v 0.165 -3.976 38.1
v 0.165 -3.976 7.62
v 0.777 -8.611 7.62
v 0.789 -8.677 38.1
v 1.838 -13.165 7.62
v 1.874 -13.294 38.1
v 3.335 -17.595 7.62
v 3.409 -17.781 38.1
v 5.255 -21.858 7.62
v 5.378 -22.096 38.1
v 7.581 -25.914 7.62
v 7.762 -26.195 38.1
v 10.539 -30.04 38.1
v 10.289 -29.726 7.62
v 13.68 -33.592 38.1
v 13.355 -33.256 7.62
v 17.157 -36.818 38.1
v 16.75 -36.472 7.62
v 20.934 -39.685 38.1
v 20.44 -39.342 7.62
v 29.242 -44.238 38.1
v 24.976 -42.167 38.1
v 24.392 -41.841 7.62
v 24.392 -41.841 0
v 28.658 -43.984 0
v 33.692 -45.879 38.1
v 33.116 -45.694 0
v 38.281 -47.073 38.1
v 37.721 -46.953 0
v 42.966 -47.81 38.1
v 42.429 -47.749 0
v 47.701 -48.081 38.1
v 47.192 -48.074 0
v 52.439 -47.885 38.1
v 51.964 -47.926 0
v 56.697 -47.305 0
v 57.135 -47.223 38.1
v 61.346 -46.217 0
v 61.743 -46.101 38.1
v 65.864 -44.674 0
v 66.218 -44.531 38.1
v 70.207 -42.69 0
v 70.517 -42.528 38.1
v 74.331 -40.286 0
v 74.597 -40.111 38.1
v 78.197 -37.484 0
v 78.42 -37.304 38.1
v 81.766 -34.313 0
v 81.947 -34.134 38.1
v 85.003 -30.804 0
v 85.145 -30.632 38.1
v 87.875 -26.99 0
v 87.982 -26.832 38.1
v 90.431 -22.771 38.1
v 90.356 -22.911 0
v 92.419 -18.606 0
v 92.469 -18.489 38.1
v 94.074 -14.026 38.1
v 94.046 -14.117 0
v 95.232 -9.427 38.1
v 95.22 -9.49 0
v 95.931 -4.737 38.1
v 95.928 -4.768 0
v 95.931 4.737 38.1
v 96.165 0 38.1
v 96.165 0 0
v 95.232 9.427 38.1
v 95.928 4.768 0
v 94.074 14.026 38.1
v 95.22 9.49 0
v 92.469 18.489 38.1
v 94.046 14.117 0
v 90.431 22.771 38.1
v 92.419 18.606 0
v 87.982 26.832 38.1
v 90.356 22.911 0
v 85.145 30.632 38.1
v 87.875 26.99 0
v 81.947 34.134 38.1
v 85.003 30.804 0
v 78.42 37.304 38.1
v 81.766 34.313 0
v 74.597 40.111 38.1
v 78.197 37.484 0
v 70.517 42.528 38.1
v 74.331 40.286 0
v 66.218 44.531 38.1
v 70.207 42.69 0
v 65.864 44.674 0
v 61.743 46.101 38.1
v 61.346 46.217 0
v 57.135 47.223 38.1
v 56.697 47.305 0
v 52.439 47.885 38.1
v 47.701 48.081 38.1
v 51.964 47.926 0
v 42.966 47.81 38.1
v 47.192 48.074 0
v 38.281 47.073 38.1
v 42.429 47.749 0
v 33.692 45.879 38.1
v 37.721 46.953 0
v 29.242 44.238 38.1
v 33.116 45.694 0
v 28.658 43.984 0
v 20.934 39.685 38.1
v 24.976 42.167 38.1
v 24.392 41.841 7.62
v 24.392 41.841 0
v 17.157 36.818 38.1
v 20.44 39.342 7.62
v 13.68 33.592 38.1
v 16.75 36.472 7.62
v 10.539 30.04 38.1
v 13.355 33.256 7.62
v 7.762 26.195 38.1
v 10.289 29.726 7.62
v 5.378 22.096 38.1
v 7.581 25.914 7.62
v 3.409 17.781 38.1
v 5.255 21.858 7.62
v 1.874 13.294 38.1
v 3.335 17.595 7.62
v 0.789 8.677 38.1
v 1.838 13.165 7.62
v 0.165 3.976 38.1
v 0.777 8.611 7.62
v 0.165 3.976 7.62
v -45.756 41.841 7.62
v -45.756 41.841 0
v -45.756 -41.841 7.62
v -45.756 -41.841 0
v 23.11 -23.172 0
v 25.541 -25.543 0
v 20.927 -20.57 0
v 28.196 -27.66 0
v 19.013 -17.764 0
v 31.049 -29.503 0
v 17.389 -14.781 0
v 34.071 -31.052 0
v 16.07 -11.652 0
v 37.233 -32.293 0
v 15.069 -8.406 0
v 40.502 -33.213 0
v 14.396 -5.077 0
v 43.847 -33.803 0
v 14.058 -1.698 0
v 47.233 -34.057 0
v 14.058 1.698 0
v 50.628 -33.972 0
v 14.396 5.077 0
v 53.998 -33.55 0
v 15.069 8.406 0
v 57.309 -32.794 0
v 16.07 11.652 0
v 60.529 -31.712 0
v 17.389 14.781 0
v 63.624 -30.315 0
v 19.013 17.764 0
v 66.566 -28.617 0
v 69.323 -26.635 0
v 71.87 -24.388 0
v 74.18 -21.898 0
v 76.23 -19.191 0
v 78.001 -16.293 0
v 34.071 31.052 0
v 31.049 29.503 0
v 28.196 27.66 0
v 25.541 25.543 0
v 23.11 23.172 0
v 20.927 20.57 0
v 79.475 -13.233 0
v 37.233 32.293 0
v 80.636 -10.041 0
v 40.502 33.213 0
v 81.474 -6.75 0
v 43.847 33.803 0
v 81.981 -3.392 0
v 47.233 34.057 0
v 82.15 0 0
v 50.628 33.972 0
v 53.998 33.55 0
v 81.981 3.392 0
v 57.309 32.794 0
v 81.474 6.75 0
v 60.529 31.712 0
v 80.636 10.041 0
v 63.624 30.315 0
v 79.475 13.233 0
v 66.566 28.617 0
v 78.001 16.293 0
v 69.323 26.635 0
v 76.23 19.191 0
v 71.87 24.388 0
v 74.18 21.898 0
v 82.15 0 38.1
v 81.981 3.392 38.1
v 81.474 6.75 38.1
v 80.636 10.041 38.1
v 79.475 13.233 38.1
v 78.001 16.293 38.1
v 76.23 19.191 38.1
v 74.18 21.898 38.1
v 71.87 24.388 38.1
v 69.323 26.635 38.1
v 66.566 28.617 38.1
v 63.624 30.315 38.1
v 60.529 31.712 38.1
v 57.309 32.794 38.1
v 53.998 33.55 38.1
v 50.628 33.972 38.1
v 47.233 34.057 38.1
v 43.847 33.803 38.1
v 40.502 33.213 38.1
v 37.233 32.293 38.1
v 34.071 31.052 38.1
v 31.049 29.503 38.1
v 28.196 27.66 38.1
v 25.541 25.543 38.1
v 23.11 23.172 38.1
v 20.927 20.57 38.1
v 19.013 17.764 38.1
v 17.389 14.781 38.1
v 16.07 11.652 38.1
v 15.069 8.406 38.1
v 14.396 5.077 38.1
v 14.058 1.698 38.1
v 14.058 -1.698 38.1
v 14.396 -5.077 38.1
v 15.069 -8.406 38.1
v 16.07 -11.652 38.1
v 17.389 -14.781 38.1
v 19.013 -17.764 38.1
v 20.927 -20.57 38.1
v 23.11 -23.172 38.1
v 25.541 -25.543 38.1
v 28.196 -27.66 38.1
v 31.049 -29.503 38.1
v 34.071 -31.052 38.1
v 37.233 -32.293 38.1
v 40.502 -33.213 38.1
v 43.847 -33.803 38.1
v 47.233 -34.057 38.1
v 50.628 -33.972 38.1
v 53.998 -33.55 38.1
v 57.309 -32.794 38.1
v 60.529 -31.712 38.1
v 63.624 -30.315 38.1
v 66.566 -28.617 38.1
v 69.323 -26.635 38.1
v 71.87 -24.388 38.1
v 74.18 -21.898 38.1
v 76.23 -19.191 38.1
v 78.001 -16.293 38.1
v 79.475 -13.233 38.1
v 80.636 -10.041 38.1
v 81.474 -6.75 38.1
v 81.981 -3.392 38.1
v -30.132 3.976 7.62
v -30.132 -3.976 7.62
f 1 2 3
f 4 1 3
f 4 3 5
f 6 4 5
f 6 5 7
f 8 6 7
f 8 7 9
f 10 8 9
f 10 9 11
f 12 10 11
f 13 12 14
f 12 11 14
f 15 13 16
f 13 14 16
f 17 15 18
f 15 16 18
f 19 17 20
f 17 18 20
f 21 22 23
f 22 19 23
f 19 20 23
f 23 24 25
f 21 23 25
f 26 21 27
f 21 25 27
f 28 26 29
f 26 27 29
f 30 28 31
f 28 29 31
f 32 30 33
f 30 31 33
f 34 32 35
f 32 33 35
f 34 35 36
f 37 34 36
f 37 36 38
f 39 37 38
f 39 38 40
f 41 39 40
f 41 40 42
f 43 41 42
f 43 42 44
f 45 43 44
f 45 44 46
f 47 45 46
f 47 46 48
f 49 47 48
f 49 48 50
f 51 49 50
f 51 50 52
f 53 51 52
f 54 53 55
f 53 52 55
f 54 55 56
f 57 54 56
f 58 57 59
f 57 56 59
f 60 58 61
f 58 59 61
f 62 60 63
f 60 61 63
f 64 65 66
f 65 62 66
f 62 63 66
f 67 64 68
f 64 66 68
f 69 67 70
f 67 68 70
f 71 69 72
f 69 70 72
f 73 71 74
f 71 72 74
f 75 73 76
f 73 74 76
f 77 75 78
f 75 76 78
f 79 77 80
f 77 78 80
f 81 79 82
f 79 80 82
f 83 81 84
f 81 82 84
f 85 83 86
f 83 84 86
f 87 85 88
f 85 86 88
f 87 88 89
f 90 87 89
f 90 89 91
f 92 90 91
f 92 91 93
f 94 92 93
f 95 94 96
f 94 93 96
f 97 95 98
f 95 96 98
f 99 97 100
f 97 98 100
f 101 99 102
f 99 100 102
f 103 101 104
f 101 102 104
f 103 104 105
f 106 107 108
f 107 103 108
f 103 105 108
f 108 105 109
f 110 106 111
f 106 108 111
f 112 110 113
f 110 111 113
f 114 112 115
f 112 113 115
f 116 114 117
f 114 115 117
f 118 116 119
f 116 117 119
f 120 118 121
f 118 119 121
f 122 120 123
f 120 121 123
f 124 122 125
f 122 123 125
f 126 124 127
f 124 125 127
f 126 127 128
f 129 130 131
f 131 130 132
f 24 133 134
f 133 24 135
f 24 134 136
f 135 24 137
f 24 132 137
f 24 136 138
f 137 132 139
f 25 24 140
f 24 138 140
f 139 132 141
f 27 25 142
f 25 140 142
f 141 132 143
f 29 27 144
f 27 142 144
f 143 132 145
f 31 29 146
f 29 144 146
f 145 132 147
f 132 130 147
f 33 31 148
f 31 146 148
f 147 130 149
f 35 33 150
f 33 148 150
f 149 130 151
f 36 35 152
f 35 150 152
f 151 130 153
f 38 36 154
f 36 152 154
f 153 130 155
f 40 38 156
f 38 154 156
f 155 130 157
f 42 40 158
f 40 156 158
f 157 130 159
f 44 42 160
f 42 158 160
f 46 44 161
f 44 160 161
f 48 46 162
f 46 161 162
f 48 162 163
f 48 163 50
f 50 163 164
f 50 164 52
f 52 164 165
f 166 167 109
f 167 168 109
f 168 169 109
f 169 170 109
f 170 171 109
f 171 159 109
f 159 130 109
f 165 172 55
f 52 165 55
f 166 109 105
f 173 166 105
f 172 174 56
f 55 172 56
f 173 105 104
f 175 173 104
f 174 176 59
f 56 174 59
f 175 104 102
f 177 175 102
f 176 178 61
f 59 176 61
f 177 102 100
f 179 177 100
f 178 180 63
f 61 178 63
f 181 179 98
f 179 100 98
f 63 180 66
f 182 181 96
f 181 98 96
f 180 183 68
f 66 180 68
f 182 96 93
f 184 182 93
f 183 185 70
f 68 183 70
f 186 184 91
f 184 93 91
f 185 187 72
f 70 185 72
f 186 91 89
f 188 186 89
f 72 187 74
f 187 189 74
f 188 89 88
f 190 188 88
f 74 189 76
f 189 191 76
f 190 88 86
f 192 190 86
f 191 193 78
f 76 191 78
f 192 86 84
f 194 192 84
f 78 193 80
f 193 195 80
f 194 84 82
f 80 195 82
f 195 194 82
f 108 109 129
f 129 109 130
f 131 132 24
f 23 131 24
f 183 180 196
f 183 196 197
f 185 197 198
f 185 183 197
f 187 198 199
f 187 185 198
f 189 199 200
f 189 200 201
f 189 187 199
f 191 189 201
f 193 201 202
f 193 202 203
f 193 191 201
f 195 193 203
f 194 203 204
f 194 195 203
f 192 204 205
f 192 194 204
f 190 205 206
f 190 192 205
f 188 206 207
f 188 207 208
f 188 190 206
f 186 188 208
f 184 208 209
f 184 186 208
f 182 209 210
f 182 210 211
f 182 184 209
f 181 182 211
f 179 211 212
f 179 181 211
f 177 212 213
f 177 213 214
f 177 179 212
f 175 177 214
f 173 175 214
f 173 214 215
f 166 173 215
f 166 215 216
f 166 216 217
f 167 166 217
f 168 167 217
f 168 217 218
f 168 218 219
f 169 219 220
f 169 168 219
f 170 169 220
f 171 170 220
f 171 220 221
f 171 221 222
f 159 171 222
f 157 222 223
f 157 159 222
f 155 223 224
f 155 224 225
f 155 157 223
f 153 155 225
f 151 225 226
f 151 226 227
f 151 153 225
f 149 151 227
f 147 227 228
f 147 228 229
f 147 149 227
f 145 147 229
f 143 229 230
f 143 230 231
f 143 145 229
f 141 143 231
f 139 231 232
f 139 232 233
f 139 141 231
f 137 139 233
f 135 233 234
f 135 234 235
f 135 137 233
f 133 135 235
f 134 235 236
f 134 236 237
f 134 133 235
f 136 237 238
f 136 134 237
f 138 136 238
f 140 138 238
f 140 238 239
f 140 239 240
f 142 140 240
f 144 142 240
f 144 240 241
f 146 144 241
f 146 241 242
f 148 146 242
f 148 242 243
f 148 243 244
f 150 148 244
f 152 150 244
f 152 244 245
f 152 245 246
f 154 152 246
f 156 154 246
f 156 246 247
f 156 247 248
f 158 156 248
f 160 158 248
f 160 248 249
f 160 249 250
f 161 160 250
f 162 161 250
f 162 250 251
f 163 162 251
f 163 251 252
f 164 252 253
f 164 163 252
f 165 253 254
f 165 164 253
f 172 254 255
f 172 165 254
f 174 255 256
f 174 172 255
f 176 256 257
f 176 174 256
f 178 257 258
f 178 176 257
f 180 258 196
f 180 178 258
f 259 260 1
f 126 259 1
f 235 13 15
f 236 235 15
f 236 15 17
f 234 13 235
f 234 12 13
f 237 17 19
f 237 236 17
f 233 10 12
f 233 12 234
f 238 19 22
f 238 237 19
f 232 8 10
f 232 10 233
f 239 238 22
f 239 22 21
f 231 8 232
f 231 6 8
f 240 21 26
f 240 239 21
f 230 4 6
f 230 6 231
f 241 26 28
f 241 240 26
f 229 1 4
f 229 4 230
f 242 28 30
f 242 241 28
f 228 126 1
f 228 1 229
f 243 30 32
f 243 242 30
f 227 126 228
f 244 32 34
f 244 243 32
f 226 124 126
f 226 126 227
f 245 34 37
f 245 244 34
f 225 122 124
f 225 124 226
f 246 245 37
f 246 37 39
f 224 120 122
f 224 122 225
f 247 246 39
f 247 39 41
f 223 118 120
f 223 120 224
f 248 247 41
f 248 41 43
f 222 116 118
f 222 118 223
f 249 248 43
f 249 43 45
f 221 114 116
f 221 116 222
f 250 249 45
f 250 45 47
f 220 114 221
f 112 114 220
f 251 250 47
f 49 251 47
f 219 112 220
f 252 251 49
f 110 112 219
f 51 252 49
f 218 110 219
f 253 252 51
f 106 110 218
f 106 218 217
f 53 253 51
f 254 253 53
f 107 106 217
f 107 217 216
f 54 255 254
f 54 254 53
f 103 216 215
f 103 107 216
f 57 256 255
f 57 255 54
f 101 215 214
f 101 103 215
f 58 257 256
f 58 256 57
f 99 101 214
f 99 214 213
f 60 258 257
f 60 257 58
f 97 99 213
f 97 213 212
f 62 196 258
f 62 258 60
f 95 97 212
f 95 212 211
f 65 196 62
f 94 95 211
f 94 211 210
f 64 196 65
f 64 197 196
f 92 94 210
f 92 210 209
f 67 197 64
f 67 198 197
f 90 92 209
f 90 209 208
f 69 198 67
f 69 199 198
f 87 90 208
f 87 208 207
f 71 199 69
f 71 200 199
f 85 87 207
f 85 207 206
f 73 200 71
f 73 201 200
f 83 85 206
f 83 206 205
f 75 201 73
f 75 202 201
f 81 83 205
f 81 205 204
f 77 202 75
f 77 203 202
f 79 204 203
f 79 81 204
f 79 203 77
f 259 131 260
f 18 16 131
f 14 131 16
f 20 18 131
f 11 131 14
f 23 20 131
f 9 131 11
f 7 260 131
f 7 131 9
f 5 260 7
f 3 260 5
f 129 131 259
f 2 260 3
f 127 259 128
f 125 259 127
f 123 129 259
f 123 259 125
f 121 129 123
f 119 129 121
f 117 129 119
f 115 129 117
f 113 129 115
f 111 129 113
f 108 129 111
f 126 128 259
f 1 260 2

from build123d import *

# Parameters (mm, degrees)
F1_DEPTH = 7.62
F2_R     = 48.082642
F2_R_2   = 34.067148
F3_DEPTH = 38.1
F5_DEPTH = 38.1
F7_DEPTH = 52.059737


with BuildPart() as f1:
    # F0 (on Top) → F1 (new body)
    with BuildSketch(Plane.XY):
        with BuildLine():
            Line((-45.755789, -41.841321), (45.755789, -41.841321))
            ThreePointArc((45.755789, -41.841321), (3.914468, 0), (45.755789, 41.841321))
            Line((45.755789, 41.841321), (-45.755789, 41.841321))
            Line((-45.755789, 41.841321), (-45.755789, -41.841321))
        make_face()
    extrude(amount=F1_DEPTH)

    # F2 (on Top) → F3 (join)
    with BuildSketch(Plane.XY):
        with Locations((48.082642, 0)):
            Circle(F2_R)
        with Locations((48.082642, 0)):
            Circle(F2_R_2, mode=Mode.SUBTRACT)
    extrude(amount=F3_DEPTH)

    # F4 (on face) → F5 (join)
    with BuildSketch(Plane.XY.offset(7.62)):
        with BuildLine():
            Line((0.164679, -3.976095), (0.164679, 3.976095))
            ThreePointArc((0.164679, 3.976095), (0, 0), (0.164679, -3.976095))
        make_face()
        with BuildLine():
            ThreePointArc((0.164679, -3.976095), (0, 0), (0.164679, 3.976095))
            Line((0.164679, 3.976095), (-30.132134, 3.976095))
            Line((-30.132134, 3.976095), (-30.132134, -3.976095))
            Line((-30.132134, -3.976095), (0.164679, -3.976095))
        make_face()
    extrude(amount=F5_DEPTH)

    # F6 (on face) → F7 (cut, through all)
    with BuildSketch(Plane.XZ.offset(3.976095)):
        Polygon((-30.132134, 7.62), (0.164679, 38.1), (0.164679, 45.72), (-30.132134, 45.72), align=None)
    extrude(amount=-F7_DEPTH, mode=Mode.SUBTRACT)


solid = f1.part
